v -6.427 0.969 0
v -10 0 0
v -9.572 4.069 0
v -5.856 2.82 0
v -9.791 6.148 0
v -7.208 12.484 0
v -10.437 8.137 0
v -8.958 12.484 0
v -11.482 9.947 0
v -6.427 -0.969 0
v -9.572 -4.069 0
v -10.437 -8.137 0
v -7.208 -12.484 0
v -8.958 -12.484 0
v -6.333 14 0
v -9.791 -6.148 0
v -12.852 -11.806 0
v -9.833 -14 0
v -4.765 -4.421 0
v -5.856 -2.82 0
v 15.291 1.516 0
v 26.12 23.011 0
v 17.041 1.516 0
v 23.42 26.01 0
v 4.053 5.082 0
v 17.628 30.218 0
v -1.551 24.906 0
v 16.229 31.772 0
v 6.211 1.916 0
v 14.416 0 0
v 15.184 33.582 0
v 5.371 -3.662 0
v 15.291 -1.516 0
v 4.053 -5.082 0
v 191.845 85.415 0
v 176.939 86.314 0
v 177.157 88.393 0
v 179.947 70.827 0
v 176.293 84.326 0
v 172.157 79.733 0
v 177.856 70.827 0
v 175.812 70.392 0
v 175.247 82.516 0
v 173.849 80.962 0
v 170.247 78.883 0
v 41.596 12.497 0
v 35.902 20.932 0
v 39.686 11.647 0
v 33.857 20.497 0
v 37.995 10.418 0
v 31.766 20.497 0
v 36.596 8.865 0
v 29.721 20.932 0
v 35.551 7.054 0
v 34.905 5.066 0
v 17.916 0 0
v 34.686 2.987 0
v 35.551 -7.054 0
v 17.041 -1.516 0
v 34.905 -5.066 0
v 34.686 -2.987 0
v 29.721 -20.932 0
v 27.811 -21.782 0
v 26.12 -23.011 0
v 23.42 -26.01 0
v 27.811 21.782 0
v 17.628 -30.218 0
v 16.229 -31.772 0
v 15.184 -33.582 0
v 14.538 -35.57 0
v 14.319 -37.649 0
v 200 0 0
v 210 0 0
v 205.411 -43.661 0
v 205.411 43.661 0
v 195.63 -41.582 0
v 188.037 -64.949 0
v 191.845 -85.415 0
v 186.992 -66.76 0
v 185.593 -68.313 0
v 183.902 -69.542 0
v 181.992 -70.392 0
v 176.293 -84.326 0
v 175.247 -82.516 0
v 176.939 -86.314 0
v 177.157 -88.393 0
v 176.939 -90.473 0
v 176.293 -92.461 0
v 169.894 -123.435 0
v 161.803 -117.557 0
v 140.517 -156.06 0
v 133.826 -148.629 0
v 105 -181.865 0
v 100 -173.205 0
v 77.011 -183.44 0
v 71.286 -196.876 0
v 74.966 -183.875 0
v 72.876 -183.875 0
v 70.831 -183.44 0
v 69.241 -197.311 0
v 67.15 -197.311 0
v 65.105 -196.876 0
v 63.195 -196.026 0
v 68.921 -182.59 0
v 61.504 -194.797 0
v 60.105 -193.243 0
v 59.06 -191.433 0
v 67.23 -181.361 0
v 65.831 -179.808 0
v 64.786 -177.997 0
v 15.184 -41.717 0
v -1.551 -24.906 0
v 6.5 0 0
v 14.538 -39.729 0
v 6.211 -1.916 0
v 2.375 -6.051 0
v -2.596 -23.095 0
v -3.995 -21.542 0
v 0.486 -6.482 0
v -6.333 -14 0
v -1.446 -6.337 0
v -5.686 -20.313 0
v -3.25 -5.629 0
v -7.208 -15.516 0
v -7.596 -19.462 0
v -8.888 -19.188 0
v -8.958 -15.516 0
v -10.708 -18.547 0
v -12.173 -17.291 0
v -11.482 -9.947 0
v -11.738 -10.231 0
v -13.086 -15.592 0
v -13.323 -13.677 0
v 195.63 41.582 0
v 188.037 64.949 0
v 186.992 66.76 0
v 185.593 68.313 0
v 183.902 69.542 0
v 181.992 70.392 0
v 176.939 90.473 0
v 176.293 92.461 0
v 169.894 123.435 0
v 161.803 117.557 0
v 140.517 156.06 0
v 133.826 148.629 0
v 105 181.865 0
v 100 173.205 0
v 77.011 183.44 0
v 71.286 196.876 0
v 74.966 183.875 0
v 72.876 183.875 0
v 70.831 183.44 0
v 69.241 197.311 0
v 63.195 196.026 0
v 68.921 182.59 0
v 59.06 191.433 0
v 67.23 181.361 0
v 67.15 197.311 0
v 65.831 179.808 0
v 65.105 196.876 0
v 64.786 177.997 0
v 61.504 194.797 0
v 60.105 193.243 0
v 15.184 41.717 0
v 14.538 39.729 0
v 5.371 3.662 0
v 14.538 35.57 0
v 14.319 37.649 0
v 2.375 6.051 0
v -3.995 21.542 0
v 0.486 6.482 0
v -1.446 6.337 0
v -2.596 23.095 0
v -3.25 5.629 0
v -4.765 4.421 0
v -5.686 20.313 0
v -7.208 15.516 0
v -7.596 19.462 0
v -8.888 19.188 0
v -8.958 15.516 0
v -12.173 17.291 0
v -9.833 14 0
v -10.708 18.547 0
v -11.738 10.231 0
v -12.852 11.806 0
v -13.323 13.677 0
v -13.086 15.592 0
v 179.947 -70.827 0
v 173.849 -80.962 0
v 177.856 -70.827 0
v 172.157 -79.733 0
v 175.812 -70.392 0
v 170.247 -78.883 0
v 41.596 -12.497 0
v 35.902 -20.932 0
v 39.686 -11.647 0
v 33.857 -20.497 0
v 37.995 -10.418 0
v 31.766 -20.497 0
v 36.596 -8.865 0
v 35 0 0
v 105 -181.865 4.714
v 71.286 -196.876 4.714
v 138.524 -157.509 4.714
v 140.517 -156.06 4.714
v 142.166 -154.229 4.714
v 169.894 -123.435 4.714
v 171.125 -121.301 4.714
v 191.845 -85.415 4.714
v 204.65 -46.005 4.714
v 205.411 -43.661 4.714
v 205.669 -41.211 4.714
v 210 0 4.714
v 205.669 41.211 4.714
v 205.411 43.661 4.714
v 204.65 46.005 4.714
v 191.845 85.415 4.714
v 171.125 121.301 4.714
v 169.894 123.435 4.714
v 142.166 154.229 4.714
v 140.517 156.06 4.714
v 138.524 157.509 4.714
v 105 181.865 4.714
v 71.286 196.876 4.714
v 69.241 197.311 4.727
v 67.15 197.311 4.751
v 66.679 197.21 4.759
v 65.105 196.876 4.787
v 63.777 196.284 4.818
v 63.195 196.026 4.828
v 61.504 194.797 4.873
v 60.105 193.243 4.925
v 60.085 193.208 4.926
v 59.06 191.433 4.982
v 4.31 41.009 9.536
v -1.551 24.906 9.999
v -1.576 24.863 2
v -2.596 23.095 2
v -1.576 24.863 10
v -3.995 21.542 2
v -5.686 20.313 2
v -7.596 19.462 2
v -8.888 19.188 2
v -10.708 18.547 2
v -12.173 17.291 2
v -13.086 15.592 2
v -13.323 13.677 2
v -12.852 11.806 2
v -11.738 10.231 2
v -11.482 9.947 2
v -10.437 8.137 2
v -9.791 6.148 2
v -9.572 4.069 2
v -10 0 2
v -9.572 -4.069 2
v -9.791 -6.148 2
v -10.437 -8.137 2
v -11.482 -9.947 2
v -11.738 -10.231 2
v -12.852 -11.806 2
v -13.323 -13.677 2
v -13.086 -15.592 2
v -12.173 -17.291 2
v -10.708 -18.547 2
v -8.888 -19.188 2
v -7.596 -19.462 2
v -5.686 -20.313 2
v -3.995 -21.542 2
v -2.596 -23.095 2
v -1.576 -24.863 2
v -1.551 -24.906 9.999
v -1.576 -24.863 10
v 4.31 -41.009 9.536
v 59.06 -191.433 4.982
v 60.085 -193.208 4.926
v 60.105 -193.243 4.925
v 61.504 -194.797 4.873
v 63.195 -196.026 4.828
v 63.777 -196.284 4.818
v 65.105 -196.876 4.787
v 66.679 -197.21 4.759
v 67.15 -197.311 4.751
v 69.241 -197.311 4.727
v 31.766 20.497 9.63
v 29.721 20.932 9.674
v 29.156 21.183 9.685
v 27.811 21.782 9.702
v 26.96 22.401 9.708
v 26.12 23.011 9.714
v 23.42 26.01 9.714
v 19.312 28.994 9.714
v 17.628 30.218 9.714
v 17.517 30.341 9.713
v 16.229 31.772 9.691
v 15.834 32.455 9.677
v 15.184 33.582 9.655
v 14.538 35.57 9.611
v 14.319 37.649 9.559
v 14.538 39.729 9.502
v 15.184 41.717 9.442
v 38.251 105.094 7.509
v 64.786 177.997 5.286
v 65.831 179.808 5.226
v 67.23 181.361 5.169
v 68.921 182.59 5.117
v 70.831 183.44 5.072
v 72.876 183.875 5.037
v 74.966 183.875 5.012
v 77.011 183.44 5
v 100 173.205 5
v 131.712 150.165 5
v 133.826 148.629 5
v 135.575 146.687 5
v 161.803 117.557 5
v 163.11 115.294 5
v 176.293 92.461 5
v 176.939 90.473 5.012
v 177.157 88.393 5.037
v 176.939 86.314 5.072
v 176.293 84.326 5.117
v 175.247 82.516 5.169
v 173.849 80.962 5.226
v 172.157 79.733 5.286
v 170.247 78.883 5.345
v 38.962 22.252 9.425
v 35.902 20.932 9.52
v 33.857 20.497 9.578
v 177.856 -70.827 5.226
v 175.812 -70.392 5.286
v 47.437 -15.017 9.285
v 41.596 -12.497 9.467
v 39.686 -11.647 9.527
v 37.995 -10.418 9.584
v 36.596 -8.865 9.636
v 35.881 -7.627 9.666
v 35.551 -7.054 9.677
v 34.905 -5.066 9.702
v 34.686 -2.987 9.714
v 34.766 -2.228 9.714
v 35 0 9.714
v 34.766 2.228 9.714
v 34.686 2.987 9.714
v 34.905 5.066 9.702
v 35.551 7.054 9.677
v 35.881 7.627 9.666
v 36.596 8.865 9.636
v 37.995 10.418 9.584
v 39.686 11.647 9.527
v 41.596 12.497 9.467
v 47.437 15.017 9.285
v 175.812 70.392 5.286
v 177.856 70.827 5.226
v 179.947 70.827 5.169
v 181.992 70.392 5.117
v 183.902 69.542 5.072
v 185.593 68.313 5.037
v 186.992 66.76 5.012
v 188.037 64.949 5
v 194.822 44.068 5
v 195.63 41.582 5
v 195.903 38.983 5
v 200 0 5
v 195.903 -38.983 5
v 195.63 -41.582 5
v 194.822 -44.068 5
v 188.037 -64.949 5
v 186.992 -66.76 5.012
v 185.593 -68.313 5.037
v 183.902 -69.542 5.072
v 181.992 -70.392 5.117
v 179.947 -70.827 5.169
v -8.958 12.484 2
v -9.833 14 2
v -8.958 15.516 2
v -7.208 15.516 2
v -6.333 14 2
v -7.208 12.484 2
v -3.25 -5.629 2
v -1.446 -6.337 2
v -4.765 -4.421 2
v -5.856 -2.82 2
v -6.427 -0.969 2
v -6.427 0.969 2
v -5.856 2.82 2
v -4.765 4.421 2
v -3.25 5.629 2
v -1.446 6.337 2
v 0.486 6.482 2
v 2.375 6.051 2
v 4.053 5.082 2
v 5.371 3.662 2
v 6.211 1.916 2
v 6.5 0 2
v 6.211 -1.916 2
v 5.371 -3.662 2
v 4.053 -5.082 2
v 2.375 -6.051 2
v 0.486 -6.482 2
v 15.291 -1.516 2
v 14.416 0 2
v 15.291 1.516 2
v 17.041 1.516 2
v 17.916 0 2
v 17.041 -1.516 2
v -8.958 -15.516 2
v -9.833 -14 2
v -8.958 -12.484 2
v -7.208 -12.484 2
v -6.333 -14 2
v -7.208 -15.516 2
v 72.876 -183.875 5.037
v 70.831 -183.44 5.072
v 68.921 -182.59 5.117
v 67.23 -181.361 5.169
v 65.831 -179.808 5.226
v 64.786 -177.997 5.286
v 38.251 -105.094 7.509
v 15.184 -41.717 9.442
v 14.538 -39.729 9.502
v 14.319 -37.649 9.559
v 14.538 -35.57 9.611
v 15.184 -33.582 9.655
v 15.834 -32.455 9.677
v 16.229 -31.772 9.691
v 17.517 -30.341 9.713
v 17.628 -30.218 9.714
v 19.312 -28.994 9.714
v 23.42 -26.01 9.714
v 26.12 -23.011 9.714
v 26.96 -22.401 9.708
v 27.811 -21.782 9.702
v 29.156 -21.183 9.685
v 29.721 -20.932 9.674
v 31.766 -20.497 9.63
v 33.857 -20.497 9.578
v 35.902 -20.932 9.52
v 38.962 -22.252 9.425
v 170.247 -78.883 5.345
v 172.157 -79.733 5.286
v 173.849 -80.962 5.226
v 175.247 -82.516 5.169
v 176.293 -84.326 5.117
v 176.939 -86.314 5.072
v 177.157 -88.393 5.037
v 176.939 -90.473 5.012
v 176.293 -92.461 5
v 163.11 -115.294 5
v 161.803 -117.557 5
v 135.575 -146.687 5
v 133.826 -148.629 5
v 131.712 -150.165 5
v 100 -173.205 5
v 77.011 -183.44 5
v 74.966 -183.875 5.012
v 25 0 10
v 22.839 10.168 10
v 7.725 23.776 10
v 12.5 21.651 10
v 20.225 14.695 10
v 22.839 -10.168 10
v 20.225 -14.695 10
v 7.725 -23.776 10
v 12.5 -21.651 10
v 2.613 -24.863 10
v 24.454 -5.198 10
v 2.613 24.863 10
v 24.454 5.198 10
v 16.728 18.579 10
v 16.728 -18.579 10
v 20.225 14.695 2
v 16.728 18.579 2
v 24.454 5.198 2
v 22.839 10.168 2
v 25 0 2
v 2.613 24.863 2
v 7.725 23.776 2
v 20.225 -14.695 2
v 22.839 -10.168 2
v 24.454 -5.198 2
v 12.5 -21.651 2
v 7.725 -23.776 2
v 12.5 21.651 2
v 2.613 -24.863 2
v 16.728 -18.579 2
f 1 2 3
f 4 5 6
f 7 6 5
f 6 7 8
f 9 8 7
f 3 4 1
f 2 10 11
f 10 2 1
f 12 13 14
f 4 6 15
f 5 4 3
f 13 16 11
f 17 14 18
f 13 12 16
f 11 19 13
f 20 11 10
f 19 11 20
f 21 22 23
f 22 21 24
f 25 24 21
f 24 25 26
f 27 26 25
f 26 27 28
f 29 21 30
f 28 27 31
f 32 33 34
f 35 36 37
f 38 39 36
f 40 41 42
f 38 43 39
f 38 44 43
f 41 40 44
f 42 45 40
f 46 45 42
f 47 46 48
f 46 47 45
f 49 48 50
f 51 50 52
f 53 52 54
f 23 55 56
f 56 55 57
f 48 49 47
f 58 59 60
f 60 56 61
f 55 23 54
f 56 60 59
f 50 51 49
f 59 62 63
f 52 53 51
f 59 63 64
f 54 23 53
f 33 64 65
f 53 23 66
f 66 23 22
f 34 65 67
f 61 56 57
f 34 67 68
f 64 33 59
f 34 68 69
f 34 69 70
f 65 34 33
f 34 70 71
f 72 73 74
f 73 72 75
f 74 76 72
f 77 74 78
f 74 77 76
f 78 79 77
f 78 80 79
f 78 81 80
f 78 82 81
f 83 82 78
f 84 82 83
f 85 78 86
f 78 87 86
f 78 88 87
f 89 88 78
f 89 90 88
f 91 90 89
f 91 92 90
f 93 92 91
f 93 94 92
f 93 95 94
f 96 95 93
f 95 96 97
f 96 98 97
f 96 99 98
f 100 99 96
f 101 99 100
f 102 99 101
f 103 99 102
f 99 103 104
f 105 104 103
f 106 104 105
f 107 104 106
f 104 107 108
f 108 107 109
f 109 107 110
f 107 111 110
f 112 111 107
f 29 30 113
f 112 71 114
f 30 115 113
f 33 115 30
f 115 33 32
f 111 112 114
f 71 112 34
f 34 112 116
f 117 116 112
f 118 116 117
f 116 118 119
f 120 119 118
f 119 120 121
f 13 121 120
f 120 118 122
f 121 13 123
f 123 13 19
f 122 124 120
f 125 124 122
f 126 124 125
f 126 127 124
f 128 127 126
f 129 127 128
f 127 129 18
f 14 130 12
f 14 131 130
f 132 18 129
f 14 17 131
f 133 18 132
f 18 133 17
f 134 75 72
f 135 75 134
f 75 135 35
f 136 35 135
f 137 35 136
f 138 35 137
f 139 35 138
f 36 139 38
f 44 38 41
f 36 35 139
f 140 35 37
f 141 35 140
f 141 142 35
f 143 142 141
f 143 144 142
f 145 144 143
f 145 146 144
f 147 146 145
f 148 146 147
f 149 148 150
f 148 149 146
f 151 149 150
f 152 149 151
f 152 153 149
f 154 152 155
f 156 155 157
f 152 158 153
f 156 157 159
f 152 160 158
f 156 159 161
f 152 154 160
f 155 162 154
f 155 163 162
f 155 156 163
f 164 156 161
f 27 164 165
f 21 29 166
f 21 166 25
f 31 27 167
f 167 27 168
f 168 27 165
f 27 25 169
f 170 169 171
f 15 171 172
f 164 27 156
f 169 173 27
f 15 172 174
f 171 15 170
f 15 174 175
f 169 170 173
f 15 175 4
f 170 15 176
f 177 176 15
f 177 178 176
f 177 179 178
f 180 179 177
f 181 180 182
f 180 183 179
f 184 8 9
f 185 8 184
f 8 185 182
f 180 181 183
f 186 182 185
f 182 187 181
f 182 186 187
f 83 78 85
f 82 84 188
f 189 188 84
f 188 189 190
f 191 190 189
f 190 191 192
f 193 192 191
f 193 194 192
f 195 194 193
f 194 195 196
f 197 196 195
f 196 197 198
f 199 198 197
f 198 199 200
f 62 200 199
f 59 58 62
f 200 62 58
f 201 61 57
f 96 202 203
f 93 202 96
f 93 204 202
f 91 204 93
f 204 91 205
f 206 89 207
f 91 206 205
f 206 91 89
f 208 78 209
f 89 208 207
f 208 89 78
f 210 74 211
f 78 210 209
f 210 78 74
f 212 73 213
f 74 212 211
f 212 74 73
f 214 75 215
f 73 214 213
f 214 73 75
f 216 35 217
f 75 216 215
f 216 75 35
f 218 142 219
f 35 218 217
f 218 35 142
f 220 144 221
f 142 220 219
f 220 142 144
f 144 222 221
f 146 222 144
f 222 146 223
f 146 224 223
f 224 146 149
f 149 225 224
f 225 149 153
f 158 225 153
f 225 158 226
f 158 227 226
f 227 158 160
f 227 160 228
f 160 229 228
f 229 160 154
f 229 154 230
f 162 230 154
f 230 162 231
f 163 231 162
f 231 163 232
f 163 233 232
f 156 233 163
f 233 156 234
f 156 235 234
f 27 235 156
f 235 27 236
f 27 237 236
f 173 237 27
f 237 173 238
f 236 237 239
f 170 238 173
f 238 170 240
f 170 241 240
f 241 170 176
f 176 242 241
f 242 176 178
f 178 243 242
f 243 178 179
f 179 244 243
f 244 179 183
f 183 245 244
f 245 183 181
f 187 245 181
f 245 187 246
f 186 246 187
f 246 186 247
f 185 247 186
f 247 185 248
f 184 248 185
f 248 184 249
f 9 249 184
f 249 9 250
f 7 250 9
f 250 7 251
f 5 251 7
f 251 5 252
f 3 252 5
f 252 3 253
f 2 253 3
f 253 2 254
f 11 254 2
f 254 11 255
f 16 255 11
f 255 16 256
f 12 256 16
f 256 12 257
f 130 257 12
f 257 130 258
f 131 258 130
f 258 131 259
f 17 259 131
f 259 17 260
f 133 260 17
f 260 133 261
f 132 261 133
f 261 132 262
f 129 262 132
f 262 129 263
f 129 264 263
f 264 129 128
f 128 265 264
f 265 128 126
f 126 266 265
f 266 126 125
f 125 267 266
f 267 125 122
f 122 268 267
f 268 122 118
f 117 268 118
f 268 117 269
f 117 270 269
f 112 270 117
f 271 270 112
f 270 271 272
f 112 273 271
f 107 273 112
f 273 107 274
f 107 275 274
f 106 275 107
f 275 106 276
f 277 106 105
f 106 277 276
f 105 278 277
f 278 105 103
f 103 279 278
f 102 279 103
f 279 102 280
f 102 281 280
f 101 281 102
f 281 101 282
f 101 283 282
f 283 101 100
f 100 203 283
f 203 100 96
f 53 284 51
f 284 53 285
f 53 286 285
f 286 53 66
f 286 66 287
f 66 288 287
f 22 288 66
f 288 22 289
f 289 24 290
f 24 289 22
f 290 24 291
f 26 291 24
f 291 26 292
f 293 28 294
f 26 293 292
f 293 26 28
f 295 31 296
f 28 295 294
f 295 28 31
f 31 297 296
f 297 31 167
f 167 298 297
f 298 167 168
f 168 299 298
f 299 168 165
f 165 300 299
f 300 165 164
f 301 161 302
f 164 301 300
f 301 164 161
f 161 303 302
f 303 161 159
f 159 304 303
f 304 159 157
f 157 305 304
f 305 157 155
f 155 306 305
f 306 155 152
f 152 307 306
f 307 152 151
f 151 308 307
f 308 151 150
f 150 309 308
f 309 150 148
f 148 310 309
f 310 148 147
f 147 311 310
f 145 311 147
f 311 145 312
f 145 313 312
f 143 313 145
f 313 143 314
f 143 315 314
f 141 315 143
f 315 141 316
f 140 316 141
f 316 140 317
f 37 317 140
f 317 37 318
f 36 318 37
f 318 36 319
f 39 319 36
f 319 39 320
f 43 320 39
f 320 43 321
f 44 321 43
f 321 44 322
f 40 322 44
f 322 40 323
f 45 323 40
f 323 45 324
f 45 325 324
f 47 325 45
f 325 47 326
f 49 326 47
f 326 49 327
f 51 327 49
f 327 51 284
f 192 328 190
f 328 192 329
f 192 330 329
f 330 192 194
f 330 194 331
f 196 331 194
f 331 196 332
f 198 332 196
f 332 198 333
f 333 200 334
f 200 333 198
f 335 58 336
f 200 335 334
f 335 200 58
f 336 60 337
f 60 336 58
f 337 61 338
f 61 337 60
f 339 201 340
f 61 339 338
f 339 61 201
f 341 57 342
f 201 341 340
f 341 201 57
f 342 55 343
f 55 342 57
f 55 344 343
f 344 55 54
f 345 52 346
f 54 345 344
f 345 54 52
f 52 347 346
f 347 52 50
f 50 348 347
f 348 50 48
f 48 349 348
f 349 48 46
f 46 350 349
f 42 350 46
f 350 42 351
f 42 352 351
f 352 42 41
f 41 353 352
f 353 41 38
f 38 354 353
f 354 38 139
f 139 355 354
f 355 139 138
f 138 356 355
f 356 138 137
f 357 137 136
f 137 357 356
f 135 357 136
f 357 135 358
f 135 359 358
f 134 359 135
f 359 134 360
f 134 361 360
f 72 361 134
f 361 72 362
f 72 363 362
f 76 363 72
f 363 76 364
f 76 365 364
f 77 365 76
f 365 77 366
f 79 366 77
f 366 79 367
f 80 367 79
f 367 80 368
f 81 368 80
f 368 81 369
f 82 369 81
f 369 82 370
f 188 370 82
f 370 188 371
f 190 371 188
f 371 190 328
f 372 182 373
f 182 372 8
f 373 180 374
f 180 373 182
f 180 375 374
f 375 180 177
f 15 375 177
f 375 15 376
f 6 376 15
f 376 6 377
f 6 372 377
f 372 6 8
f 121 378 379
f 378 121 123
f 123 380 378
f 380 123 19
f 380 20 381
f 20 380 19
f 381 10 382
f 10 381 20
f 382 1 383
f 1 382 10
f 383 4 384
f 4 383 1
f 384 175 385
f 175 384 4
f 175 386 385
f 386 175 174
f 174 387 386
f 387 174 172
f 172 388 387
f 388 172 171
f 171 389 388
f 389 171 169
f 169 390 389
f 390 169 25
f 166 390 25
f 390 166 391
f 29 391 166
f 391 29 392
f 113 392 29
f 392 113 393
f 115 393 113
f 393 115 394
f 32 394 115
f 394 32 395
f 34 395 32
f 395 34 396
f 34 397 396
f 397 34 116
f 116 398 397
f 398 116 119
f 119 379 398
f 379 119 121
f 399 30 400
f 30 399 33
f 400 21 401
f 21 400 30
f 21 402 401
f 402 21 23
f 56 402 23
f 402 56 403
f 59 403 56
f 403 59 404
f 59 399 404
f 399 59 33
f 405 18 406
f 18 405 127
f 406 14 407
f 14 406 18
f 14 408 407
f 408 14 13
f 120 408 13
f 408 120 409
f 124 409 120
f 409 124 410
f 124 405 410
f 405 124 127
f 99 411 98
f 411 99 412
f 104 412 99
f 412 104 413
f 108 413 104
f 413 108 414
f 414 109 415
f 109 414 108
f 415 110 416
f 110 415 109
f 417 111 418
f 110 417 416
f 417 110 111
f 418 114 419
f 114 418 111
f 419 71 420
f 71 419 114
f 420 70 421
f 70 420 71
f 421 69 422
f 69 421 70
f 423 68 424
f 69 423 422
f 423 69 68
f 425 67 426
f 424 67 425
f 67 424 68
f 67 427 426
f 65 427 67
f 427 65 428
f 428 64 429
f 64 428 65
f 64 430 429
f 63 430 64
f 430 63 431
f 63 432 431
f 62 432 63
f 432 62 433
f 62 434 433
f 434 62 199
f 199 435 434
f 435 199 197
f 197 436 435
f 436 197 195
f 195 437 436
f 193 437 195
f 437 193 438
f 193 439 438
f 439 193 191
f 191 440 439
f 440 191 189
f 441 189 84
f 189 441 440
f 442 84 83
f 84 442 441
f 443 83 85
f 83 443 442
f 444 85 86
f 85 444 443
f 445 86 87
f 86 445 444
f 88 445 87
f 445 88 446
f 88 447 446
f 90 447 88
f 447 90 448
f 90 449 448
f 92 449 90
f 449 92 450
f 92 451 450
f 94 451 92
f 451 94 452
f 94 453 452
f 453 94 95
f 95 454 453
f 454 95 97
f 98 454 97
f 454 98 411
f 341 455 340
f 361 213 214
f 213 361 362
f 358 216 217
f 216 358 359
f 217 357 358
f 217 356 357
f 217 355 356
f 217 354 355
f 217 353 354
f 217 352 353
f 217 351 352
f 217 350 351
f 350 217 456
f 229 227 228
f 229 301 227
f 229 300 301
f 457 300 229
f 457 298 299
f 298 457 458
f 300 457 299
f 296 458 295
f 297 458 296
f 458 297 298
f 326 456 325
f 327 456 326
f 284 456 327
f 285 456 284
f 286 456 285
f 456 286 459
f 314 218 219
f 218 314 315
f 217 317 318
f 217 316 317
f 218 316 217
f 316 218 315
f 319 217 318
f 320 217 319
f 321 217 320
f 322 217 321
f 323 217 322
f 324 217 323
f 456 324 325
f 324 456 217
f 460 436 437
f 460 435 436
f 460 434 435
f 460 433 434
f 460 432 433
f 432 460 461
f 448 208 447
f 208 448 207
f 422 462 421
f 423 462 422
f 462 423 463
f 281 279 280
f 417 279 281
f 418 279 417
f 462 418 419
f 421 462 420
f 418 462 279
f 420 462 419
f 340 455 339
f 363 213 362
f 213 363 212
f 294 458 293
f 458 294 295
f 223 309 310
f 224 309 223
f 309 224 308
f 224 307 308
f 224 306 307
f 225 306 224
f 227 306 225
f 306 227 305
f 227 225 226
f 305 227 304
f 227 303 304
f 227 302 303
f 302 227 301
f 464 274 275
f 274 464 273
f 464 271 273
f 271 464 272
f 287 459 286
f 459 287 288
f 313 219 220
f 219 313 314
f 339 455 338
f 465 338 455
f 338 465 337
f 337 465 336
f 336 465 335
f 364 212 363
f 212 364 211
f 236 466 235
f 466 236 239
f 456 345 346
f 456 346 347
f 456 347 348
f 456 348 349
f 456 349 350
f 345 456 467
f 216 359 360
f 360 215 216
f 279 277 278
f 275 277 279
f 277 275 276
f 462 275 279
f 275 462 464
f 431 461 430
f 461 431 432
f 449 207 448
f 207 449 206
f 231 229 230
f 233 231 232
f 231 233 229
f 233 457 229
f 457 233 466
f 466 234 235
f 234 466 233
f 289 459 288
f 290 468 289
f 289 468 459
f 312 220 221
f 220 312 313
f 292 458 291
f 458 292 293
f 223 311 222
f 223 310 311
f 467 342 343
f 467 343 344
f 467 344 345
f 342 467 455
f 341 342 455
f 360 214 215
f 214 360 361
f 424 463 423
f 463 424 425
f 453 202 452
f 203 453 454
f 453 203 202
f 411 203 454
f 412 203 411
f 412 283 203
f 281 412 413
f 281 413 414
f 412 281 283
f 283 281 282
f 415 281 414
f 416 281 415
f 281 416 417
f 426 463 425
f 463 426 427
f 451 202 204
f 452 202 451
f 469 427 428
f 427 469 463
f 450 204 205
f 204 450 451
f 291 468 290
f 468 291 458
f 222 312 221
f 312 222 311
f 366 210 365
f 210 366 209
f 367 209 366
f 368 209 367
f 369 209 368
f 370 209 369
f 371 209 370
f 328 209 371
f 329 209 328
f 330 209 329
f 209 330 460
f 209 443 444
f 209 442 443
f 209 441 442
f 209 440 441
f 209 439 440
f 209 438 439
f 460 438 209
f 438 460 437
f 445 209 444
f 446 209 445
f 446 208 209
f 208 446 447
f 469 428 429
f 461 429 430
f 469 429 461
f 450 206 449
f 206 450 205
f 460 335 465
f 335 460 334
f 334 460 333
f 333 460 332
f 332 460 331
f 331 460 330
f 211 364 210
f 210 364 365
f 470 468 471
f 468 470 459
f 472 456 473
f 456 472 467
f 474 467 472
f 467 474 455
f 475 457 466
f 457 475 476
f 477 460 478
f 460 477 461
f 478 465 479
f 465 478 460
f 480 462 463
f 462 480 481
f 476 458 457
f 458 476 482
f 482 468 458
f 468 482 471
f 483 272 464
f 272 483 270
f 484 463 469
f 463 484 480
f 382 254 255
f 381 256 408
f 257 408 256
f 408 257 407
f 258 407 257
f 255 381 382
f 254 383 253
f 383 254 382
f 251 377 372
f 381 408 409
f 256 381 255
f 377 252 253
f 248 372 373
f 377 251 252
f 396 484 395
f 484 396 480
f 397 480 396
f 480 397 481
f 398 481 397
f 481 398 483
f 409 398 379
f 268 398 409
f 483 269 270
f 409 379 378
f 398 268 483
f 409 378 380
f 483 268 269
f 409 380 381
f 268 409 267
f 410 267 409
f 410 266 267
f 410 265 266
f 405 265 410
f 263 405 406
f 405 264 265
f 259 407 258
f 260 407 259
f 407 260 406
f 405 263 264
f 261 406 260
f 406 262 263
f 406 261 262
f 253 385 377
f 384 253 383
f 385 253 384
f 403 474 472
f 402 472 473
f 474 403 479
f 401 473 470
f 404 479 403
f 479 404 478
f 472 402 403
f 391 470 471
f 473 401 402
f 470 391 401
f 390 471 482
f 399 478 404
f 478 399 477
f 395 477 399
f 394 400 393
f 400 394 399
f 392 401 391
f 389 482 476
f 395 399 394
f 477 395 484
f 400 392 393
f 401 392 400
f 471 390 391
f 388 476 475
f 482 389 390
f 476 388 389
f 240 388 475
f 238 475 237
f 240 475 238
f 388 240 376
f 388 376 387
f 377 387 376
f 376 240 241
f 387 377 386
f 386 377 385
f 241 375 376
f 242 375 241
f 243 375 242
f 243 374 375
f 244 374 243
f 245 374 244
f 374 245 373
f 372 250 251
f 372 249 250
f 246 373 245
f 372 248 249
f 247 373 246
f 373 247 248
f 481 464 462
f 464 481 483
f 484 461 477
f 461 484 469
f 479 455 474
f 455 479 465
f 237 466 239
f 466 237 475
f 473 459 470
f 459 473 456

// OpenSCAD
// Which one would you like to see?
part = "3d"; // [propguard_3d:3D version good for 3D printing, 2d:produces 2d stl version, route: produces 2d dxf for routing]

// radius of guard
r = 200; 

// width of supports
w = 10; 

// thickness of guard
t = 10; 

// outer thickness of guard, used in 3d version
to = 5; 

// start angle of guard
angle_start = -70;

// stop angle of guard
angle_stop = 70; 

// number of supports inside guard
n_supports = 2; 

// diameter of motor
d_motor = 50;

// thickness of motor mount
t_motor = 2;

// diameter of motor screws, helpful to make slightly larger than actual screw
d_screw = 3.5;

// diameter of motor shaft
d_shaft = 13;

// triangular screw separation, setup for tarot motors
screw_sep = 28;

////////////////////////////////////////////////////////////////

module outset(r) {
    minkowski() {
        circle(r=r);
        children();
    }
}

module inverse() {
	difference() {
		square(1e5,center=true);
		children();
	}
}

module fillet(r=1) {
	inset(r=r) render() outset(r=r) children();
}

module rounding(r=1) {
	outset(r=r) inset(r=r) children();
}

module inset(r) {
    inverse() outset(r) inverse() children();
}

module pie_slice(r, start_angle, end_angle) {
    R = r * sqrt(2) + 1;
    a0 = (4 * start_angle + 0 * end_angle) / 4;
    a1 = (3 * start_angle + 1 * end_angle) / 4;
    a2 = (2 * start_angle + 2 * end_angle) / 4;
    a3 = (1 * start_angle + 3 * end_angle) / 4;
    a4 = (0 * start_angle + 4 * end_angle) / 4;
    if(end_angle > start_angle)
        intersection() {
        circle(r);
        polygon([
            [0,0],
            [R * cos(a0), R * sin(a0)],
            [R * cos(a1), R * sin(a1)],
            [R * cos(a2), R * sin(a2)],
            [R * cos(a3), R * sin(a3)],
            [R * cos(a4), R * sin(a4)],
            [0,0]
       ]);
    }
}

module guard_shape(r, w, angle_start, angle_stop, n_supports, d_motor, mount_r) {
    render() {
        pie_slice(mount_r, angle_start, angle_stop);
        difference() {
            outset(r=w) pie_slice(r, angle_start, angle_stop);
            pie_slice(r, angle_start, angle_stop);
        }
        delta_angle = (angle_stop - angle_start) / (n_supports + 1);
        for (n = [1: 1: n_supports]) {
            a = angle_start + n*delta_angle;
            rotate(a) translate([r/2, 0]) square([r, w], center=true);
        }
    }
}

module drill_holes(d, sep) {
    x = sep / 2 / cos(30);
    for (angle=[0:120:360]) {
        rotate(angle) translate([x, 0]) circle(d=d);
    }
}

module guard_2d(r, w, t, angle_start, angle_stop, n_supports, d_motor, d_shaft, mount_r=0) {
    if (mount_r == 0) {
        mount_r = d_motor/2;
    }
    difference() {
        fillet(r=w) union() {
            guard_shape(r=r, w=w, angle_start=angle_start, angle_stop=angle_stop,
                n_supports=n_supports, d_motor=d_motor, mount_r=mount_r);
            drill_holes(d=d_screw*3, sep=screw_sep);
        }
        drill_holes(d=d_screw, sep=screw_sep);
        circle(d=d_shaft);
    }
}

module motor() {
    translate([0, 0, t_motor]) color("blue", 0.1) linear_extrude(20) circle(d=d_motor);
}

module guard_3d(r, w, t, angle_start, angle_stop, n_supports, d_motor, d_shaft, to) {
    ro = r;
    ri = d_motor/2;
    ti = t;
    r2 = (ro*ti - ri*to)/(ti - to);
    mount_r = d_motor/2 + w;
    d_shaft = d_shaft;
    render() difference() {
        intersection() {
            linear_extrude(t) guard_2d(r=r, w=w, t=t, angle_start=angle_start,
                angle_stop=angle_stop, n_supports=n_supports, d_motor=d_motor,
                mount_r=mount_r, d_shaft=d_shaft);
            cylinder(h=t, r1=r2, r2=d_motor/2);
        }
        motor();
    }
}

if (part == "2d") {
    linear_extrude(t_motor) guard_2d(r=r, w=w, t=t_motor,
        angle_start=angle_start, angle_stop=angle_stop, n_supports=n_supports, d_motor=d_motor, d_shaft=d_shaft);
} else if (part == "route") {
    guard_2d(r=r, w=w, t=t_motor,
            angle_start=angle_start, angle_stop=angle_stop, n_supports=n_supports, d_motor=d_motor, d_shaft=d_shaft);
} else if (part == "3d") {
    guard_3d(r=r, w=w, t=t, angle_start=angle_start, angle_stop=angle_stop, n_supports=n_supports,
        d_motor=d_motor, d_shaft=d_shaft, to=to);
}
